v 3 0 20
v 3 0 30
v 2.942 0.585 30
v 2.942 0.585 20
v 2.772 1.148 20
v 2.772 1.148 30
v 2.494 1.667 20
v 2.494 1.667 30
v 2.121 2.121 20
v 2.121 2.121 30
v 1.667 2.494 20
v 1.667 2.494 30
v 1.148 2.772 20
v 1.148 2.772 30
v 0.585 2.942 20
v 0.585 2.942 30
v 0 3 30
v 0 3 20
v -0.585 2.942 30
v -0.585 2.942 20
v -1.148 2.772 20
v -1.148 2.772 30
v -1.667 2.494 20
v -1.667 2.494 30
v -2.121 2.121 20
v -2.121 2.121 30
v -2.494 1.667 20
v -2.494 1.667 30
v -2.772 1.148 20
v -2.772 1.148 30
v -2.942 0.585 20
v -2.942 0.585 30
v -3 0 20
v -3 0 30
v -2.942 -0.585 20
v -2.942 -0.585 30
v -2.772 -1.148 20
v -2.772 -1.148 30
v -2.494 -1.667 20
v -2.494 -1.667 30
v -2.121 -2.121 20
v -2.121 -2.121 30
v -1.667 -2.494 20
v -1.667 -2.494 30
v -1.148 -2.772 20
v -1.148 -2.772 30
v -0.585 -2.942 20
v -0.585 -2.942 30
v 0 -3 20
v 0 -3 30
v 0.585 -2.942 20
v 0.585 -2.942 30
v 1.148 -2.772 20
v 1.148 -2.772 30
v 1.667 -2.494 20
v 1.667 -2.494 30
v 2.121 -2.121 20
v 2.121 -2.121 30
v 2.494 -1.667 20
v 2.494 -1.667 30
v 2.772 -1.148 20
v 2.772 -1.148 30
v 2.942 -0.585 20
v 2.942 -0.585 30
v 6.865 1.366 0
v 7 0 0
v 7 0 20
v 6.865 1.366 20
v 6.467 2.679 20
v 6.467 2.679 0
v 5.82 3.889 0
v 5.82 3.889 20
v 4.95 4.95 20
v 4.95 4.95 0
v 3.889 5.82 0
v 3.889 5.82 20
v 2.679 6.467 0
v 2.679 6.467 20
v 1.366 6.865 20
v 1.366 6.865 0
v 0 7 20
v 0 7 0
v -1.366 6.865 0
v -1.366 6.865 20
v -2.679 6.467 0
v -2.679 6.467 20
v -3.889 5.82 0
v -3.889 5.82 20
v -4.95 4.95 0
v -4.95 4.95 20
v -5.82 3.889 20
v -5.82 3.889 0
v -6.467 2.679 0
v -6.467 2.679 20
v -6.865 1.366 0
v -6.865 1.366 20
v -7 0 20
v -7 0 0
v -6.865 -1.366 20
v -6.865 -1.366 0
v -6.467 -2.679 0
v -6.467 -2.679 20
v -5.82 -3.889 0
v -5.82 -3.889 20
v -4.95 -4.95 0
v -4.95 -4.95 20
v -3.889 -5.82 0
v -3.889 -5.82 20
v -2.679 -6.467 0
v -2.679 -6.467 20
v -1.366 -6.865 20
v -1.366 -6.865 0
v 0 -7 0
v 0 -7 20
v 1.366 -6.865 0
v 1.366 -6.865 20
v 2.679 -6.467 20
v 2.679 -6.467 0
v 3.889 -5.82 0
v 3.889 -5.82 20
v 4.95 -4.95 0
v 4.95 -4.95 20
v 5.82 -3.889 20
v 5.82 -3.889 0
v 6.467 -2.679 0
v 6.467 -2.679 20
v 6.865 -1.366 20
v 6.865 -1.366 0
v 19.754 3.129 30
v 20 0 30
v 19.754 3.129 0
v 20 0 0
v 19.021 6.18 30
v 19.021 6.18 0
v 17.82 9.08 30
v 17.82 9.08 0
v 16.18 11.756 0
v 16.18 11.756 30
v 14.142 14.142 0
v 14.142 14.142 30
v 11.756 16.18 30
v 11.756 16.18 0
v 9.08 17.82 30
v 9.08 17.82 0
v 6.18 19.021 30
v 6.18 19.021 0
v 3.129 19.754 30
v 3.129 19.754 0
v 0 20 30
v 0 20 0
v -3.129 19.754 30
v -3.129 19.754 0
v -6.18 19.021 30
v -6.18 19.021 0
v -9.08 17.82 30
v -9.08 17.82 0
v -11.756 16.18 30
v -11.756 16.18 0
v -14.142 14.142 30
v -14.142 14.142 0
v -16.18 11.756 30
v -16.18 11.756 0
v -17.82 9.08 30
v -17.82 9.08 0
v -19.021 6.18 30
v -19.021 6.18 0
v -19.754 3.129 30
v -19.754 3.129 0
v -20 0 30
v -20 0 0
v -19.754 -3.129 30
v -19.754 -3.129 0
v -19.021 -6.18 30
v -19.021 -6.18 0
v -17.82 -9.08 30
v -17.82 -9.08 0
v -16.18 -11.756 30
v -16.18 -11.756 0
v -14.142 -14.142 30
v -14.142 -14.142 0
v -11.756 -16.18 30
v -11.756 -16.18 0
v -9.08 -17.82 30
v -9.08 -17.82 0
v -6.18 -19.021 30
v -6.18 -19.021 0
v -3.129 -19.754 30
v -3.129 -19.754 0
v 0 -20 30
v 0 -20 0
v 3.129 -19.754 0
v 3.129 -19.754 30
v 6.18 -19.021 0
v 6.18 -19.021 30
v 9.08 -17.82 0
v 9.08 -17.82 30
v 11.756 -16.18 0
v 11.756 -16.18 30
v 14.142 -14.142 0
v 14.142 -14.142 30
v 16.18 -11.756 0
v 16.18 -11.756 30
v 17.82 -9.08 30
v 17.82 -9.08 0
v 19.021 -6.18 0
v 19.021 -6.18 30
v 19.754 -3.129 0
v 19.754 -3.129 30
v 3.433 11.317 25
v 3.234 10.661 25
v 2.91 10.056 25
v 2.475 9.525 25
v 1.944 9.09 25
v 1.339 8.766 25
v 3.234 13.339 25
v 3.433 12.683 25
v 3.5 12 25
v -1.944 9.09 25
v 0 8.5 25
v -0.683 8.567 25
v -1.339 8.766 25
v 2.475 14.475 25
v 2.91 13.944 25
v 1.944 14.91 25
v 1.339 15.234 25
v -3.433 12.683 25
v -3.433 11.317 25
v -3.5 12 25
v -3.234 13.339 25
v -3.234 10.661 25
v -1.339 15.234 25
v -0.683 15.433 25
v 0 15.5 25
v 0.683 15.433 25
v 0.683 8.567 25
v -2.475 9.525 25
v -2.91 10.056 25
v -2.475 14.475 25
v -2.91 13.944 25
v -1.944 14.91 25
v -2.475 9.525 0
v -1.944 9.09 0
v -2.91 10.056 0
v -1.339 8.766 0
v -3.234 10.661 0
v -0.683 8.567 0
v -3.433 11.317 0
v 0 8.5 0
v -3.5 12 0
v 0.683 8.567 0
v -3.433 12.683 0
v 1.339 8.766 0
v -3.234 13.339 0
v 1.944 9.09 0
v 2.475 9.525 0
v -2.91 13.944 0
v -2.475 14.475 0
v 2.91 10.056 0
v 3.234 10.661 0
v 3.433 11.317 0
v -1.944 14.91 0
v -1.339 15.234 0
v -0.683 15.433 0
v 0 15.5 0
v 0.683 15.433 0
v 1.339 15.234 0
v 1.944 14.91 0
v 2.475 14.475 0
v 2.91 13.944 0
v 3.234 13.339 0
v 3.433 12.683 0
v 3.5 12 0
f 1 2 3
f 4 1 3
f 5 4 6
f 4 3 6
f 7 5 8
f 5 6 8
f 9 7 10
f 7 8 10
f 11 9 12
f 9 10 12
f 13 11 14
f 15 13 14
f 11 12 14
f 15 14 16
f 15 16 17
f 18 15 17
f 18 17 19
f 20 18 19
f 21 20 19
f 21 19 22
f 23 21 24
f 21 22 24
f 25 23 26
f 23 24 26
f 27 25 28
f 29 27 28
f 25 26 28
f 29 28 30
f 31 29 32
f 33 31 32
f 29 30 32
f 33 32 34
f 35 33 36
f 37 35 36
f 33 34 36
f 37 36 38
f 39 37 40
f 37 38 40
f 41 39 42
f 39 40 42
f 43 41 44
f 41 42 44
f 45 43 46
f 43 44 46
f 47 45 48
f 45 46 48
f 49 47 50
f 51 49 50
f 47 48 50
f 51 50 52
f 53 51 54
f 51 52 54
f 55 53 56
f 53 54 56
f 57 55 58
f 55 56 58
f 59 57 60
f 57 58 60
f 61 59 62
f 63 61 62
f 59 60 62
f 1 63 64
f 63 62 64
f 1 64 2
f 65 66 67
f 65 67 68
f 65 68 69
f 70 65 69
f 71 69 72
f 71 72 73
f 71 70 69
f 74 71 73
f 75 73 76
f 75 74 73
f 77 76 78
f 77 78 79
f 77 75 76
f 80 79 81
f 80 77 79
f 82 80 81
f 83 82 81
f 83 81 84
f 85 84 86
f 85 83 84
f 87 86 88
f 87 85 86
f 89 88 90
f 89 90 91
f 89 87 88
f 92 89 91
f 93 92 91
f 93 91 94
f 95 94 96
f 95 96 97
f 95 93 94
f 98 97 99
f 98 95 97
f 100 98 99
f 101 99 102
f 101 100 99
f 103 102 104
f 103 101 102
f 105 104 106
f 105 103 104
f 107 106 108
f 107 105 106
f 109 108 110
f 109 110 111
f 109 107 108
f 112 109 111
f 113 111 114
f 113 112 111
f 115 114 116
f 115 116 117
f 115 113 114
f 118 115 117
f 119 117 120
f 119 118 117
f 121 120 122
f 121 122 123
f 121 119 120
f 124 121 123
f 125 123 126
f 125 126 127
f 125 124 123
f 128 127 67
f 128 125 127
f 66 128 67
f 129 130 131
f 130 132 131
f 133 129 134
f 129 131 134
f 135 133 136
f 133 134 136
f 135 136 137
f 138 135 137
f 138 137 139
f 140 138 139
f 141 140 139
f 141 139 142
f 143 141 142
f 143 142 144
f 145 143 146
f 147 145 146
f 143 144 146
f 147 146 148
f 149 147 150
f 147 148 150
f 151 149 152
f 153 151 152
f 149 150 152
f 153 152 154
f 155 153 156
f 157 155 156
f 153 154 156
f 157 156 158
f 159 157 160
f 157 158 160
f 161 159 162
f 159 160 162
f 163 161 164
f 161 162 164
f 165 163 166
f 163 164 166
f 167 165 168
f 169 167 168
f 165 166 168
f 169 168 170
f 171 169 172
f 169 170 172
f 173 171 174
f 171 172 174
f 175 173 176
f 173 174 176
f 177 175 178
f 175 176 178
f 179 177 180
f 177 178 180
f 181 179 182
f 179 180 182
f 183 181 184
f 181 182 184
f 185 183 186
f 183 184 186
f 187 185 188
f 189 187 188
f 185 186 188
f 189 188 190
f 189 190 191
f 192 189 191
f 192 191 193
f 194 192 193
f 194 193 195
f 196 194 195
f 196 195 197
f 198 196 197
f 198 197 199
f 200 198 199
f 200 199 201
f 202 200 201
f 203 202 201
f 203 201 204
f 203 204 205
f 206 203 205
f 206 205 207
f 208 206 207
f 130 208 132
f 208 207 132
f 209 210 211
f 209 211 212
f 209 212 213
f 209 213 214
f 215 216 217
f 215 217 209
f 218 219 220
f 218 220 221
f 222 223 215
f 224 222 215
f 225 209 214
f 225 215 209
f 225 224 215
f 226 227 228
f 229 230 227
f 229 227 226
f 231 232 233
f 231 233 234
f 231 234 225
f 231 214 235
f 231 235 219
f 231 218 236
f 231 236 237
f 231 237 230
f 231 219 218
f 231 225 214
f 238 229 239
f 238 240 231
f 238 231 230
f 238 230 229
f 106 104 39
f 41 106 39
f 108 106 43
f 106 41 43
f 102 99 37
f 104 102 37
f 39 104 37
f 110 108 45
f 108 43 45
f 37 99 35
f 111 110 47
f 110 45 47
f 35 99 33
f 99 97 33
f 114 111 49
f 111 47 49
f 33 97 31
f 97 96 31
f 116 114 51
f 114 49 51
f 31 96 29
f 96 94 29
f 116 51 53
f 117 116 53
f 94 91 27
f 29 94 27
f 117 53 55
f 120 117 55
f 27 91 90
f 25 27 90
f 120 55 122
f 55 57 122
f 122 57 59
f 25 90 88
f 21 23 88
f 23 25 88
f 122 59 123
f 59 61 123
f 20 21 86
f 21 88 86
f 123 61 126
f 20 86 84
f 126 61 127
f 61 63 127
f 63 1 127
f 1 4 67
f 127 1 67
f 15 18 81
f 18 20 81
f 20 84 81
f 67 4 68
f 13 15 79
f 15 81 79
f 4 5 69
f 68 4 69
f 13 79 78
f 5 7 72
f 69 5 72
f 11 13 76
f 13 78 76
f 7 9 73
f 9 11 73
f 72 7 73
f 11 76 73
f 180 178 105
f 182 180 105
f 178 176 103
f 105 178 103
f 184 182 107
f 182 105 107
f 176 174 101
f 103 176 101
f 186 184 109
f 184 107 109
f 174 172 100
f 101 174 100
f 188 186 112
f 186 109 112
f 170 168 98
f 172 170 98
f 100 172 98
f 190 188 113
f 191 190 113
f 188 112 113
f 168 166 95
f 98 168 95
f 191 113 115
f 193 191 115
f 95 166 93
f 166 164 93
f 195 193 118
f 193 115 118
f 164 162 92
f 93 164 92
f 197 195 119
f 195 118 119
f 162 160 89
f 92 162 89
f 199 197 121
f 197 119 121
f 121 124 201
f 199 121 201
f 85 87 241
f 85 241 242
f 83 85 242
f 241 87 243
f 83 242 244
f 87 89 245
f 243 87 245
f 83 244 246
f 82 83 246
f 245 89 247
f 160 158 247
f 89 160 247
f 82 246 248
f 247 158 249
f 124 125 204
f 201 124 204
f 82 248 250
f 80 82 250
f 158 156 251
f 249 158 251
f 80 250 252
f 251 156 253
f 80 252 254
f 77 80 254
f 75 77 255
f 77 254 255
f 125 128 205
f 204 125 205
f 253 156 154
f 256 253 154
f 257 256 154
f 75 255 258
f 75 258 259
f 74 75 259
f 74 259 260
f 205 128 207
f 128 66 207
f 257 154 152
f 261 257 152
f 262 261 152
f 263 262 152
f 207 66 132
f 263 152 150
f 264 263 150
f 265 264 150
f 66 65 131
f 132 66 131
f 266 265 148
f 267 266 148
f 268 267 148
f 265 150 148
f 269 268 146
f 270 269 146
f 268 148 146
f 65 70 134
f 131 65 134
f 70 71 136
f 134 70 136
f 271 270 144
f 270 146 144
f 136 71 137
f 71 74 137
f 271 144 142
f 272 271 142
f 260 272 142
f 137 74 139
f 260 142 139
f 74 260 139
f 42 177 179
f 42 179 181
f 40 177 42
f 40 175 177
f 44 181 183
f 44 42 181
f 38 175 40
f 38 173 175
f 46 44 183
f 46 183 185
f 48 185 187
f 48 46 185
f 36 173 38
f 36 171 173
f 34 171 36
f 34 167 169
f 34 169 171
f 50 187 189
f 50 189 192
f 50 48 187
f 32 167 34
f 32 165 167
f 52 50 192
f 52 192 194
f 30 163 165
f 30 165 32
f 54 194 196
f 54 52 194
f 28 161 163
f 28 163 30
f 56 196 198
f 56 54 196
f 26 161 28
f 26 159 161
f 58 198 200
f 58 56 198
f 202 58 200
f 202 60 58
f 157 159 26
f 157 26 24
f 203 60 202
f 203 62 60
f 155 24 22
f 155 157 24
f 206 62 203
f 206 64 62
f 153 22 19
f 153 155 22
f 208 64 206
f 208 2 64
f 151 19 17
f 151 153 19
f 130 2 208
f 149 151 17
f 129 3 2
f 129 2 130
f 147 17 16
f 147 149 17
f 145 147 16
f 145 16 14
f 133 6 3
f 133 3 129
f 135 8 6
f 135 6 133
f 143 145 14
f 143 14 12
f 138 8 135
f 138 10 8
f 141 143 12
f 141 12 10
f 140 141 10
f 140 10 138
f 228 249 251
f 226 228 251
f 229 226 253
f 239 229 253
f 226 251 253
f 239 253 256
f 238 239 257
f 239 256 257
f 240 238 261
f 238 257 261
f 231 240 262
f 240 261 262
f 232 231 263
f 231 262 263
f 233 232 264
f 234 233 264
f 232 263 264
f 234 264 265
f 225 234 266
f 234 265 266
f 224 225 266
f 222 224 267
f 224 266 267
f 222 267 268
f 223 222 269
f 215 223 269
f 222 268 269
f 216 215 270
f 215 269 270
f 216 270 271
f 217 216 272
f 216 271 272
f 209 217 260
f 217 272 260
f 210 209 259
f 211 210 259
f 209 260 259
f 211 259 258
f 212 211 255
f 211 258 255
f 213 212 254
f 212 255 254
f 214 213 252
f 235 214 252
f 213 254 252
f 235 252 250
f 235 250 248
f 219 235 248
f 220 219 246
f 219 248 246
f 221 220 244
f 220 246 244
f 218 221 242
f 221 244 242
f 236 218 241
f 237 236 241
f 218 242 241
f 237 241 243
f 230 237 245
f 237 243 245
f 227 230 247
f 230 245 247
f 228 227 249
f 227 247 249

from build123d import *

# Parameters (mm, degrees)
SKETCH_1_R          = 20
SKETCH_1_R_2        = 7
EXTRUDE_1_DEPTH     = 20
SKETCH_2_R          = 20
EXTRUDE_2_DEPTH     = 10
SKETCH_3_R          = 3
CUT_EXTRUDE_1_DEPTH = 10
SKETCH_4_R          = 3.5
CUT_EXTRUDE_2_DEPTH = 25


with BuildPart() as part:
    # 草图1 → 凸台-拉伸1 (new body)
    with BuildSketch(Plane.XY):
        Circle(SKETCH_1_R)
        Circle(SKETCH_1_R_2, mode=Mode.SUBTRACT)
    extrude(amount=EXTRUDE_1_DEPTH)

    # 草图2 → 凸台-拉伸2 (add)
    with BuildSketch(Plane.XY.offset(20)):
        Circle(SKETCH_2_R)
    extrude(amount=EXTRUDE_2_DEPTH)

    # 草图3 → 切除-拉伸1 (cut)
    with BuildSketch(Plane.XY.offset(30)):
        Circle(SKETCH_3_R)
    extrude(amount=-CUT_EXTRUDE_1_DEPTH, mode=Mode.SUBTRACT)

    # 草图4 → 切除-拉伸2 (cut)
    with BuildSketch(Plane(origin=(0, 0, 0), x_dir=(-1, 0, 0), z_dir=(0, 0, -1))):
        with Locations((0, 12)):
            Circle(SKETCH_4_R)
    extrude(amount=-CUT_EXTRUDE_2_DEPTH, mode=Mode.SUBTRACT)


solid = part.part
